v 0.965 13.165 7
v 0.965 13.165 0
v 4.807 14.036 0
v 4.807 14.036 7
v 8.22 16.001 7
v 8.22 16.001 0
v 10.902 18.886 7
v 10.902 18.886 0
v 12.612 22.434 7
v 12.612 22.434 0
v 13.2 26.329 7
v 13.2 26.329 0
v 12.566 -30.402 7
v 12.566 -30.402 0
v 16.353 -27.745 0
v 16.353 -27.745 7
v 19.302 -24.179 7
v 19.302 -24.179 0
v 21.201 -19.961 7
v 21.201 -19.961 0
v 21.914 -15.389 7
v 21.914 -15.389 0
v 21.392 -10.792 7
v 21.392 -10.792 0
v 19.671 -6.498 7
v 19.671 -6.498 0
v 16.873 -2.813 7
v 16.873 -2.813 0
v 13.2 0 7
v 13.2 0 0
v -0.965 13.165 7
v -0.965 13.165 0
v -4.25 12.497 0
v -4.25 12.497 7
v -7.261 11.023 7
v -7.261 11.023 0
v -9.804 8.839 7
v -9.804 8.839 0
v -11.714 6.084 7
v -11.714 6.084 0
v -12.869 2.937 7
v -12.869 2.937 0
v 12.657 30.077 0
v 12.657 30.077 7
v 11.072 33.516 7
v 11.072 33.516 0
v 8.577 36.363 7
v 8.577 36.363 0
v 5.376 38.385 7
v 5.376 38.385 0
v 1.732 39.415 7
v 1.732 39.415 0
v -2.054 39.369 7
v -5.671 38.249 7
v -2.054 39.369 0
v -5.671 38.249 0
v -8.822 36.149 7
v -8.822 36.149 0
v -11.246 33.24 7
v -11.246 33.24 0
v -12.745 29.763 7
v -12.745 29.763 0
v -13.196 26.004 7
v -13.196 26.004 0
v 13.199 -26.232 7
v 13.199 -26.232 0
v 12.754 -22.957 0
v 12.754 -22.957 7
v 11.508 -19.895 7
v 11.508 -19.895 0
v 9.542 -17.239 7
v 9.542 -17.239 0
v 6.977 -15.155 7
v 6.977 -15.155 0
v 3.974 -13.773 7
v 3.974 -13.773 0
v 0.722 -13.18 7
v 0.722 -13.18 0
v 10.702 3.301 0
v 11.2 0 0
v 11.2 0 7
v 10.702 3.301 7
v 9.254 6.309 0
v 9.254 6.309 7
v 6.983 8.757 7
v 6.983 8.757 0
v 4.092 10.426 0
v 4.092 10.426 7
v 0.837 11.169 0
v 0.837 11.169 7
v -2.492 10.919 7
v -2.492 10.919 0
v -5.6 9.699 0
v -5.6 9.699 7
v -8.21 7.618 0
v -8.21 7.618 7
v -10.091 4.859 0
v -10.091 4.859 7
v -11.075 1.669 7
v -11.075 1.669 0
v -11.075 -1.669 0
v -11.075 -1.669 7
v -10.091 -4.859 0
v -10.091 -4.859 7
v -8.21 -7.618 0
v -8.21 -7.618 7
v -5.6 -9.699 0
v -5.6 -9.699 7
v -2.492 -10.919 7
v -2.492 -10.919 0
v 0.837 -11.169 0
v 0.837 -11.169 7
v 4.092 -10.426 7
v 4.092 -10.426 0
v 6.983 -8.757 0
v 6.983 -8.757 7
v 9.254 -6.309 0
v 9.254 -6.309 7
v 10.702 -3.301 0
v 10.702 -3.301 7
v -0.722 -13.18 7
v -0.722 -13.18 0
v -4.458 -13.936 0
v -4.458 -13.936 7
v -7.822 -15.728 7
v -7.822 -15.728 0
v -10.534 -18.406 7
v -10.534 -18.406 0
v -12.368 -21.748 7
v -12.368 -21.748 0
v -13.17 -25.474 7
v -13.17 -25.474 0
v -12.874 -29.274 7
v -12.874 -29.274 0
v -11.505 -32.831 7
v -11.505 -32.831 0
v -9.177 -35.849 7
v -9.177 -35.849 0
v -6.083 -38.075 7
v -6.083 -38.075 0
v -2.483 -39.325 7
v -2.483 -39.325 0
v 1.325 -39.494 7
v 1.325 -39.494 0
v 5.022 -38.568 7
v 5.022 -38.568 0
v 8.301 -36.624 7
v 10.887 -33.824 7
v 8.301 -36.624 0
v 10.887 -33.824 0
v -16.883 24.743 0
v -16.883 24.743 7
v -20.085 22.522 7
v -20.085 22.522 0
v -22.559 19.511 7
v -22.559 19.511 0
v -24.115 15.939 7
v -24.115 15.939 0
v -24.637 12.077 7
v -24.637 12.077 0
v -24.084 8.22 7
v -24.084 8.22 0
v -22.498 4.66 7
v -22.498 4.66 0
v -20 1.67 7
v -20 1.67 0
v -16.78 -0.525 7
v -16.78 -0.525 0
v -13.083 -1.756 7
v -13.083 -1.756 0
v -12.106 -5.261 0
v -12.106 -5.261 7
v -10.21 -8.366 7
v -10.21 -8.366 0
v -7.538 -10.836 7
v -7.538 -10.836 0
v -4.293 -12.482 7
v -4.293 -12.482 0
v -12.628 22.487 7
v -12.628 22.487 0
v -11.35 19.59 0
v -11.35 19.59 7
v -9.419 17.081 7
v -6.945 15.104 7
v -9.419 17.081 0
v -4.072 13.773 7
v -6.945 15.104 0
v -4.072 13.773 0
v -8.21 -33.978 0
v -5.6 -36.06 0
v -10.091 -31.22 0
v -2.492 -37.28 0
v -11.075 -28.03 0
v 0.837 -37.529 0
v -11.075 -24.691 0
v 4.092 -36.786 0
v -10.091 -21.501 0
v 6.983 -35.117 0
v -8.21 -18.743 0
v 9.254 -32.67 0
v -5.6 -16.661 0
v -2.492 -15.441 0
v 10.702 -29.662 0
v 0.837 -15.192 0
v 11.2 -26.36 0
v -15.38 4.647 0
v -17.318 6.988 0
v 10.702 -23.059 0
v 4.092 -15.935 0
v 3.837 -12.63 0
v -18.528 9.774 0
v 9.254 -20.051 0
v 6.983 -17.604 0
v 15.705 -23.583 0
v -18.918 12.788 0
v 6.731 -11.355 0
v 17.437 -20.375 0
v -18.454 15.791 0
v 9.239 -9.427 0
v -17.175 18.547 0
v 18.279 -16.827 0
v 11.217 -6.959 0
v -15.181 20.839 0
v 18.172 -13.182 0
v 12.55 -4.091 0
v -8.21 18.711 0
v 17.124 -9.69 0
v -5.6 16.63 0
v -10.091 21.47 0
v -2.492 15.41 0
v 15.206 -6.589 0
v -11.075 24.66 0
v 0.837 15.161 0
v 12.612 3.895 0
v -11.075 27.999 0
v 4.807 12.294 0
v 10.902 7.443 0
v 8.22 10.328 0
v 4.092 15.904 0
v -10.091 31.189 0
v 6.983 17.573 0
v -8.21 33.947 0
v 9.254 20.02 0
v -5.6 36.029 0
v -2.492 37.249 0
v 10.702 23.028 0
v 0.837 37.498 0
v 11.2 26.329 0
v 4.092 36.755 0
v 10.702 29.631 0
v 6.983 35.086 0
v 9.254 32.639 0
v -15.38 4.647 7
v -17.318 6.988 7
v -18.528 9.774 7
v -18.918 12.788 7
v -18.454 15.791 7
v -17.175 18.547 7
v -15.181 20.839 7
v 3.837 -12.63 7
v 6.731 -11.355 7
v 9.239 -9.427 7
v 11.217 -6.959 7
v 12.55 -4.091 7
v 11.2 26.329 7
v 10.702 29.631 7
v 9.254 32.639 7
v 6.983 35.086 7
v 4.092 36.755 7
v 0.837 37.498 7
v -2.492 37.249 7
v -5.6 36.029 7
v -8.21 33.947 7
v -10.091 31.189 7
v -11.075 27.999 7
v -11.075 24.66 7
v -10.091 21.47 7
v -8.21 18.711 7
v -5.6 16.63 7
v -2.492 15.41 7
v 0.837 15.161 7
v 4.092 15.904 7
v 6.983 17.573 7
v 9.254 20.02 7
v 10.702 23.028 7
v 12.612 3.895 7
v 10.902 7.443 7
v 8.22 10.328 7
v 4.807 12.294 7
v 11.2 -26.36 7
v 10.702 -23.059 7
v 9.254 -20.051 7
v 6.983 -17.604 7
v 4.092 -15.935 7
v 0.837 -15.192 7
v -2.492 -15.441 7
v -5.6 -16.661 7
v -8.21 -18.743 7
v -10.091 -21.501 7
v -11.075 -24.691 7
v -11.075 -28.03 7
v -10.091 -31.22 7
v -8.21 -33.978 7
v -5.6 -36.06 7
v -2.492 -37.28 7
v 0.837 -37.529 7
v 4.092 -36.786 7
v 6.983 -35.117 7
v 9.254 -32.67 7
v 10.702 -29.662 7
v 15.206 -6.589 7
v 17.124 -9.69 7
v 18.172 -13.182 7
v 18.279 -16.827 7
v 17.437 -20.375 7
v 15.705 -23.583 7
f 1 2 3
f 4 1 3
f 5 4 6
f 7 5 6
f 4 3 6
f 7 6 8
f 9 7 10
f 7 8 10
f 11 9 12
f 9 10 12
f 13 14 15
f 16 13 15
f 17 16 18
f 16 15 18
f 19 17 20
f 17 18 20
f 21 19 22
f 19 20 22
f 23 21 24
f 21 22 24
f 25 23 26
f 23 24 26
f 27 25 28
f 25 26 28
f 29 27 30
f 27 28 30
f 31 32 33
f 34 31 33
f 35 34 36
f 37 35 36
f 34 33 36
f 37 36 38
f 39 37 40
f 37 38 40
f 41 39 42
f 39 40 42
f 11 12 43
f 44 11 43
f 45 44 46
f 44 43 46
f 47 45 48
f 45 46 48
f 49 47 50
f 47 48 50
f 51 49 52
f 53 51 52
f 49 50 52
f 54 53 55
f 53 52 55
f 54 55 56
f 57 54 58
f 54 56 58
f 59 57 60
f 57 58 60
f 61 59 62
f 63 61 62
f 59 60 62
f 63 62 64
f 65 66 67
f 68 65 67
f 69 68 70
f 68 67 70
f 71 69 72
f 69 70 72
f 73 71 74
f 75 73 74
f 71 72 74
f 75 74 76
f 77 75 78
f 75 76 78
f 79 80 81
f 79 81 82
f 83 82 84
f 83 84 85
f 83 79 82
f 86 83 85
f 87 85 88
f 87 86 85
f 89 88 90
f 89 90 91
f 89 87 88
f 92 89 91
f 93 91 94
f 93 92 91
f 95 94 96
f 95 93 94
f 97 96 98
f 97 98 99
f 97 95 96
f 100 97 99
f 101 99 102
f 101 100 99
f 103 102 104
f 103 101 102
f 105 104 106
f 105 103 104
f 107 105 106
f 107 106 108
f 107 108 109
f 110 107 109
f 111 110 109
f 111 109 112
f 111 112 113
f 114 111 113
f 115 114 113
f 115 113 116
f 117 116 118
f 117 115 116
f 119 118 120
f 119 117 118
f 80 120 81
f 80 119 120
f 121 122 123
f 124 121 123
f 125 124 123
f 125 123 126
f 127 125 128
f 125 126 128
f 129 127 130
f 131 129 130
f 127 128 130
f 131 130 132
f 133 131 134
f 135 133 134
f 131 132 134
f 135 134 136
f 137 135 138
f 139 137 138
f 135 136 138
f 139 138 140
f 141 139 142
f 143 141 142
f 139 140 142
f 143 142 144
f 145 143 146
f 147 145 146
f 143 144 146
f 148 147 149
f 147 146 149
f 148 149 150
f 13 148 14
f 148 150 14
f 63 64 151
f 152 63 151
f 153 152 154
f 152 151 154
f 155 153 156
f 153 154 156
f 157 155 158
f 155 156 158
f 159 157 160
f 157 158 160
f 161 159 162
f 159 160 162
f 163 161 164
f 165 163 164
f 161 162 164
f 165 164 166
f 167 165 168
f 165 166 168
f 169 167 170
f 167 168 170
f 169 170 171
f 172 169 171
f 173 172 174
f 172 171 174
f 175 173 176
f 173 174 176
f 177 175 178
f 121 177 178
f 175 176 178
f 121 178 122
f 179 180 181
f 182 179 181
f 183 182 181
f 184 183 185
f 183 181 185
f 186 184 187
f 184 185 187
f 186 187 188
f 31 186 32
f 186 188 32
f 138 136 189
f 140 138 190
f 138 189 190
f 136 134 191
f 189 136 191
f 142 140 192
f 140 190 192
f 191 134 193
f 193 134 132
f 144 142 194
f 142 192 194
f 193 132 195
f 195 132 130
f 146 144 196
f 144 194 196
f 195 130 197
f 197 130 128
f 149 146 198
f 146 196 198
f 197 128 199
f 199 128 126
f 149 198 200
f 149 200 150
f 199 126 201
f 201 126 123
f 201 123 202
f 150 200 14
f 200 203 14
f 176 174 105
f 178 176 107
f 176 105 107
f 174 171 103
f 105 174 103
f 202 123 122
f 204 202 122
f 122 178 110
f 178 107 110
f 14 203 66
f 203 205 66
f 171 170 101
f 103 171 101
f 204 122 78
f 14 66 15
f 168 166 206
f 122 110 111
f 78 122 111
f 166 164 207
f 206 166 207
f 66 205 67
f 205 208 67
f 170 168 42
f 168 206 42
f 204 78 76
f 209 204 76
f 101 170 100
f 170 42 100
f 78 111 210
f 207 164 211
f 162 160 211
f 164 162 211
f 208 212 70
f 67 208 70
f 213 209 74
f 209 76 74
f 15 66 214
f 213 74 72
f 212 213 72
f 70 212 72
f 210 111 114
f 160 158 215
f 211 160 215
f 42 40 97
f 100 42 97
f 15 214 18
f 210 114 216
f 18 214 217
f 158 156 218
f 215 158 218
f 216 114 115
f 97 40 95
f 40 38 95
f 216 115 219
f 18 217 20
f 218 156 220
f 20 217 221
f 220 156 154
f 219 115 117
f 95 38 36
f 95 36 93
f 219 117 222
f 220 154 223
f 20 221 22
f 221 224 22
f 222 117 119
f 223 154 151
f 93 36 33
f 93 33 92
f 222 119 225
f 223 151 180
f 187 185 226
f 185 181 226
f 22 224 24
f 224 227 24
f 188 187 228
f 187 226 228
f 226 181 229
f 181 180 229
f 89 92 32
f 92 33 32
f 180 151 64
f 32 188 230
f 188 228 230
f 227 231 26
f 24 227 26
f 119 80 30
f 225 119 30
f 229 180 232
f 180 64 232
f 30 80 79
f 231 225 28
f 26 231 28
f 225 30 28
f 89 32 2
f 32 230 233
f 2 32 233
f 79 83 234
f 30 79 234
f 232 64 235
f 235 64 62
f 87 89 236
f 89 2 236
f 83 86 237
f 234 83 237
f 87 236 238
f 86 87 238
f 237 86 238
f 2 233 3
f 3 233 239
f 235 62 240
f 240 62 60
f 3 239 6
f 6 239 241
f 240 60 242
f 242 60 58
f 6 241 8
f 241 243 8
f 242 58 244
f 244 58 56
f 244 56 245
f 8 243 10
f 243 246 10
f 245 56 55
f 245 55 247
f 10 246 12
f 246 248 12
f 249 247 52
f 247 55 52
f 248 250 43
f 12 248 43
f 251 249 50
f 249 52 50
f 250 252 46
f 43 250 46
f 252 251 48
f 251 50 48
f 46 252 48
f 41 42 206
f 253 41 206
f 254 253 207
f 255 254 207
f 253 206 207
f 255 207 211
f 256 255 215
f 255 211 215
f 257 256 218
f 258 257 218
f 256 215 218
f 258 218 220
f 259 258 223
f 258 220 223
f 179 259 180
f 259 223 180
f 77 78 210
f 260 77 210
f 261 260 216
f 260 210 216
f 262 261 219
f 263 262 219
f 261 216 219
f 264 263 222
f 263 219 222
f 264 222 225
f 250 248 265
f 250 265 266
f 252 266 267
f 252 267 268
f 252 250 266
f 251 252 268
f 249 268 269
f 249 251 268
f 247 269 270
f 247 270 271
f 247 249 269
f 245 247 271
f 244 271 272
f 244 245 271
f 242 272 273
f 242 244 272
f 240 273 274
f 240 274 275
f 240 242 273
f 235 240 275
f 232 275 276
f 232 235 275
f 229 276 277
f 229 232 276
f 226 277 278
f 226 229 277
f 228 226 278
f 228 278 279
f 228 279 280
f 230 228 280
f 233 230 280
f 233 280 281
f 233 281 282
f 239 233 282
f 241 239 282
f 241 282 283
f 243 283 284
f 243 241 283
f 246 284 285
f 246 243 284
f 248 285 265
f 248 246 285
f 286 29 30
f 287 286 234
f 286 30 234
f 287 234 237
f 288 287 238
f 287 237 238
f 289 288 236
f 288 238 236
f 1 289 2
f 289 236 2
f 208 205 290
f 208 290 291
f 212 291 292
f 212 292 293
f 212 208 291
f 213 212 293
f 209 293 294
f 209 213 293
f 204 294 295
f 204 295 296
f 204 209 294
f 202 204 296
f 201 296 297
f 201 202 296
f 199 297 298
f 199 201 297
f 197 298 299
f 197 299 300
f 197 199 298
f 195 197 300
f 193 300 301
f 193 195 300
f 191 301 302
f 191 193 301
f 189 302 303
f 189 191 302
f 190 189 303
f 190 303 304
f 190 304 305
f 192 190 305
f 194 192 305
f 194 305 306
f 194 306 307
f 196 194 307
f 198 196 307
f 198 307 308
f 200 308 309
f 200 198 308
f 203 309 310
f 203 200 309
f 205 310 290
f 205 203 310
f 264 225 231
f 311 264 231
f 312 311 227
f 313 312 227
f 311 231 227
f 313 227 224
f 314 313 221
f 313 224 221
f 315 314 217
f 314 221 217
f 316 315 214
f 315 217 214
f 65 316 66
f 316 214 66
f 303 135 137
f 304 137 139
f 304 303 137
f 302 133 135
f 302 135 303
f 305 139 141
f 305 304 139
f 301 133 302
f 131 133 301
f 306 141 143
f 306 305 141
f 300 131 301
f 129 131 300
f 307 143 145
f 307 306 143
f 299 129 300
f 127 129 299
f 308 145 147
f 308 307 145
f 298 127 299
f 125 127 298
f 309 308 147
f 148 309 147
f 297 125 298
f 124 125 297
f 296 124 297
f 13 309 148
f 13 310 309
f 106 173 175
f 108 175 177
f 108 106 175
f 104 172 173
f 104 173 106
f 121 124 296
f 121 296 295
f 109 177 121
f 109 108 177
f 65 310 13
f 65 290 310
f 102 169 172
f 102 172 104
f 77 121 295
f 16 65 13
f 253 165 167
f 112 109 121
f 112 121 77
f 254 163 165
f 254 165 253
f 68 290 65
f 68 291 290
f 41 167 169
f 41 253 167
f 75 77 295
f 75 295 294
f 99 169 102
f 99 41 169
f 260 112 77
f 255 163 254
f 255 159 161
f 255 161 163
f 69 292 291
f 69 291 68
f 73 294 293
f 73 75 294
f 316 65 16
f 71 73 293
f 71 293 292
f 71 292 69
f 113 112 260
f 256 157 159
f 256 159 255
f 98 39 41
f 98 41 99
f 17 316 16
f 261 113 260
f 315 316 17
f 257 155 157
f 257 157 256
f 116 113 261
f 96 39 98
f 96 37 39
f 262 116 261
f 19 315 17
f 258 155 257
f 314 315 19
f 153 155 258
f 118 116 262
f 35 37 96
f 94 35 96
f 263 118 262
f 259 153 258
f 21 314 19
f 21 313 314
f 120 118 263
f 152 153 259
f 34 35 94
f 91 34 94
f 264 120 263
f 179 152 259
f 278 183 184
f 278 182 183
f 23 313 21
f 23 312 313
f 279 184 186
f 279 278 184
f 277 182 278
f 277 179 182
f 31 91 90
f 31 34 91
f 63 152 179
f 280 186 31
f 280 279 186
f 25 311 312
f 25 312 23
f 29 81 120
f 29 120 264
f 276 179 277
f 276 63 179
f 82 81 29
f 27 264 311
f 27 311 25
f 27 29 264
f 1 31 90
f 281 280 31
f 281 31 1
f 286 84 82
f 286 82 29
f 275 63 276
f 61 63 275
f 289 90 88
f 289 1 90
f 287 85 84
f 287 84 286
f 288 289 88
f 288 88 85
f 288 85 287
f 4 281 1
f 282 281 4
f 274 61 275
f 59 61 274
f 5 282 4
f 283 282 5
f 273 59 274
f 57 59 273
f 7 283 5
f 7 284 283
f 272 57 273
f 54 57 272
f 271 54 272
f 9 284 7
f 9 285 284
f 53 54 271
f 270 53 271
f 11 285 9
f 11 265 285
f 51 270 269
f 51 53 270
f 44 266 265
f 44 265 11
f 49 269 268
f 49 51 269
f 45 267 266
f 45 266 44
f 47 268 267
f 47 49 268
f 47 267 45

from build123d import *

# Parameters (mm, degrees)
F0_R     = 11.2
F1_DEPTH = 7


with BuildPart() as f1:
    # F0 (on Top) → F1 (new body)
    with BuildSketch(Plane.XY):
        with BuildLine():
            ThreePointArc((-0.9650827881, 13.1646730006), (-8.6022624346, 10.012046794), (-12.8691579618, 2.9367964443))
            ThreePointArc((-12.8691579618, 2.9367964443), (-13.1863620091, 0.599880793), (-13.0826534178, -1.7561832335))
            ThreePointArc((-13.0826534178, -1.7561832335), (-8.9594650145, -9.693708612), (-0.722399634, -13.1802177057))
            ThreePointArc((-0.722399634, -13.1802177057), (0, -13.1604354113), (0.722399634, -13.1802177057))
            ThreePointArc((0.722399634, -13.1802177057), (8.0432942537, -10.4663946777), (12.5501283831, -4.0907551342))
            ThreePointArc((12.5501283831, -4.0907551342), (13.0365197552, -2.0710269606), (13.2, 0))
            ThreePointArc((13.2, 0), (9.6689992451, 8.9861256167), (0.9650827881, 13.1646730006))
            ThreePointArc((0.9650827881, 13.1646730006), (0, 13.1293460011), (-0.9650827881, 13.1646730006))
        make_face()
        Circle(F0_R, mode=Mode.SUBTRACT)
        with BuildLine():
            ThreePointArc((-13.0826534178, -1.7561832335), (-13.1863620091, 0.599880793), (-12.8691579618, 2.9367964443))
            ThreePointArc((-12.8691579618, 2.9367964443), (-18.9175577348, 12.787783411), (-12.6283316175, 22.4867894878))
            ThreePointArc((-12.6283316175, 22.4867894878), (-13.0313646183, 24.2261255691), (-13.1959884441, 26.0039401262))
            ThreePointArc((-13.1959884441, 26.0039401262), (-24.637001113, 12.0769373767), (-13.0826534178, -1.7561832335))
        make_face()
        with BuildLine():
            ThreePointArc((-12.6283316175, 22.4867894878), (-8.2414011401, 16.0182205898), (-0.9650827881, 13.1646730006))
            ThreePointArc((-0.9650827881, 13.1646730006), (0, 13.2), (0.9650827881, 13.1646730006))
            ThreePointArc((0.9650827881, 13.1646730006), (9.6689992451, 17.3432203845), (13.2, 26.3293460011))
            ThreePointArc((13.2, 26.3293460011), (-0.1627153004, 39.5283430741), (-13.1959884441, 26.0039401262))
            ThreePointArc((-13.1959884441, 26.0039401262), (-13.0313646183, 24.2261255691), (-12.6283316175, 22.4867894878))
        make_face()
        with Locations((0, 26.3293460011)):
            Circle(F0_R, mode=Mode.SUBTRACT)
        with BuildLine():
            ThreePointArc((0.9650827881, 13.1646730006), (0, 13.2), (-0.9650827881, 13.1646730006))
            ThreePointArc((-0.9650827881, 13.1646730006), (0, 13.1293460011), (0.9650827881, 13.1646730006))
        make_face()
        with BuildLine():
            ThreePointArc((0.722399634, -13.1802177057), (0, -13.1604354113), (-0.722399634, -13.1802177057))
            ThreePointArc((-0.722399634, -13.1802177057), (0, -13.2), (0.722399634, -13.1802177057))
        make_face()
        with BuildLine():
            ThreePointArc((0.722399634, -13.1802177057), (0, -13.2), (-0.722399634, -13.1802177057))
            ThreePointArc((-0.722399634, -13.1802177057), (-10.4506279527, -34.4242047158), (12.566049408, -30.4020195408))
            ThreePointArc((12.566049408, -30.4020195408), (13.0405493018, -28.4059363053), (13.2, -26.3604354113))
            ThreePointArc((13.2, -26.3604354113), (13.1998442738, -26.2963171862), (13.199377099, -26.2322004739))
            ThreePointArc((13.199377099, -26.2322004739), (9.5416209523, -17.2391707181), (0.722399634, -13.1802177057))
        make_face()
        with Locations((0, -26.3604354113)):
            Circle(F0_R, mode=Mode.SUBTRACT)
        with BuildLine():
            ThreePointArc((13.2, -26.3604354113), (13.0405493018, -28.4059363053), (12.566049408, -30.4020195408))
            ThreePointArc((12.566049408, -30.4020195408), (21.9144963269, -15.3893362984), (13.2, 0))
            ThreePointArc((13.2, 0), (13.0365197552, -2.0710269606), (12.5501283831, -4.0907551342))
            ThreePointArc((12.5501283831, -4.0907551342), (18.3451878997, -15.001069441), (13.199377099, -26.2322004739))
            ThreePointArc((13.199377099, -26.2322004739), (13.1998442738, -26.2963171862), (13.2, -26.3604354113))
        make_face()
    extrude(amount=F1_DEPTH)


solid = f1.part
